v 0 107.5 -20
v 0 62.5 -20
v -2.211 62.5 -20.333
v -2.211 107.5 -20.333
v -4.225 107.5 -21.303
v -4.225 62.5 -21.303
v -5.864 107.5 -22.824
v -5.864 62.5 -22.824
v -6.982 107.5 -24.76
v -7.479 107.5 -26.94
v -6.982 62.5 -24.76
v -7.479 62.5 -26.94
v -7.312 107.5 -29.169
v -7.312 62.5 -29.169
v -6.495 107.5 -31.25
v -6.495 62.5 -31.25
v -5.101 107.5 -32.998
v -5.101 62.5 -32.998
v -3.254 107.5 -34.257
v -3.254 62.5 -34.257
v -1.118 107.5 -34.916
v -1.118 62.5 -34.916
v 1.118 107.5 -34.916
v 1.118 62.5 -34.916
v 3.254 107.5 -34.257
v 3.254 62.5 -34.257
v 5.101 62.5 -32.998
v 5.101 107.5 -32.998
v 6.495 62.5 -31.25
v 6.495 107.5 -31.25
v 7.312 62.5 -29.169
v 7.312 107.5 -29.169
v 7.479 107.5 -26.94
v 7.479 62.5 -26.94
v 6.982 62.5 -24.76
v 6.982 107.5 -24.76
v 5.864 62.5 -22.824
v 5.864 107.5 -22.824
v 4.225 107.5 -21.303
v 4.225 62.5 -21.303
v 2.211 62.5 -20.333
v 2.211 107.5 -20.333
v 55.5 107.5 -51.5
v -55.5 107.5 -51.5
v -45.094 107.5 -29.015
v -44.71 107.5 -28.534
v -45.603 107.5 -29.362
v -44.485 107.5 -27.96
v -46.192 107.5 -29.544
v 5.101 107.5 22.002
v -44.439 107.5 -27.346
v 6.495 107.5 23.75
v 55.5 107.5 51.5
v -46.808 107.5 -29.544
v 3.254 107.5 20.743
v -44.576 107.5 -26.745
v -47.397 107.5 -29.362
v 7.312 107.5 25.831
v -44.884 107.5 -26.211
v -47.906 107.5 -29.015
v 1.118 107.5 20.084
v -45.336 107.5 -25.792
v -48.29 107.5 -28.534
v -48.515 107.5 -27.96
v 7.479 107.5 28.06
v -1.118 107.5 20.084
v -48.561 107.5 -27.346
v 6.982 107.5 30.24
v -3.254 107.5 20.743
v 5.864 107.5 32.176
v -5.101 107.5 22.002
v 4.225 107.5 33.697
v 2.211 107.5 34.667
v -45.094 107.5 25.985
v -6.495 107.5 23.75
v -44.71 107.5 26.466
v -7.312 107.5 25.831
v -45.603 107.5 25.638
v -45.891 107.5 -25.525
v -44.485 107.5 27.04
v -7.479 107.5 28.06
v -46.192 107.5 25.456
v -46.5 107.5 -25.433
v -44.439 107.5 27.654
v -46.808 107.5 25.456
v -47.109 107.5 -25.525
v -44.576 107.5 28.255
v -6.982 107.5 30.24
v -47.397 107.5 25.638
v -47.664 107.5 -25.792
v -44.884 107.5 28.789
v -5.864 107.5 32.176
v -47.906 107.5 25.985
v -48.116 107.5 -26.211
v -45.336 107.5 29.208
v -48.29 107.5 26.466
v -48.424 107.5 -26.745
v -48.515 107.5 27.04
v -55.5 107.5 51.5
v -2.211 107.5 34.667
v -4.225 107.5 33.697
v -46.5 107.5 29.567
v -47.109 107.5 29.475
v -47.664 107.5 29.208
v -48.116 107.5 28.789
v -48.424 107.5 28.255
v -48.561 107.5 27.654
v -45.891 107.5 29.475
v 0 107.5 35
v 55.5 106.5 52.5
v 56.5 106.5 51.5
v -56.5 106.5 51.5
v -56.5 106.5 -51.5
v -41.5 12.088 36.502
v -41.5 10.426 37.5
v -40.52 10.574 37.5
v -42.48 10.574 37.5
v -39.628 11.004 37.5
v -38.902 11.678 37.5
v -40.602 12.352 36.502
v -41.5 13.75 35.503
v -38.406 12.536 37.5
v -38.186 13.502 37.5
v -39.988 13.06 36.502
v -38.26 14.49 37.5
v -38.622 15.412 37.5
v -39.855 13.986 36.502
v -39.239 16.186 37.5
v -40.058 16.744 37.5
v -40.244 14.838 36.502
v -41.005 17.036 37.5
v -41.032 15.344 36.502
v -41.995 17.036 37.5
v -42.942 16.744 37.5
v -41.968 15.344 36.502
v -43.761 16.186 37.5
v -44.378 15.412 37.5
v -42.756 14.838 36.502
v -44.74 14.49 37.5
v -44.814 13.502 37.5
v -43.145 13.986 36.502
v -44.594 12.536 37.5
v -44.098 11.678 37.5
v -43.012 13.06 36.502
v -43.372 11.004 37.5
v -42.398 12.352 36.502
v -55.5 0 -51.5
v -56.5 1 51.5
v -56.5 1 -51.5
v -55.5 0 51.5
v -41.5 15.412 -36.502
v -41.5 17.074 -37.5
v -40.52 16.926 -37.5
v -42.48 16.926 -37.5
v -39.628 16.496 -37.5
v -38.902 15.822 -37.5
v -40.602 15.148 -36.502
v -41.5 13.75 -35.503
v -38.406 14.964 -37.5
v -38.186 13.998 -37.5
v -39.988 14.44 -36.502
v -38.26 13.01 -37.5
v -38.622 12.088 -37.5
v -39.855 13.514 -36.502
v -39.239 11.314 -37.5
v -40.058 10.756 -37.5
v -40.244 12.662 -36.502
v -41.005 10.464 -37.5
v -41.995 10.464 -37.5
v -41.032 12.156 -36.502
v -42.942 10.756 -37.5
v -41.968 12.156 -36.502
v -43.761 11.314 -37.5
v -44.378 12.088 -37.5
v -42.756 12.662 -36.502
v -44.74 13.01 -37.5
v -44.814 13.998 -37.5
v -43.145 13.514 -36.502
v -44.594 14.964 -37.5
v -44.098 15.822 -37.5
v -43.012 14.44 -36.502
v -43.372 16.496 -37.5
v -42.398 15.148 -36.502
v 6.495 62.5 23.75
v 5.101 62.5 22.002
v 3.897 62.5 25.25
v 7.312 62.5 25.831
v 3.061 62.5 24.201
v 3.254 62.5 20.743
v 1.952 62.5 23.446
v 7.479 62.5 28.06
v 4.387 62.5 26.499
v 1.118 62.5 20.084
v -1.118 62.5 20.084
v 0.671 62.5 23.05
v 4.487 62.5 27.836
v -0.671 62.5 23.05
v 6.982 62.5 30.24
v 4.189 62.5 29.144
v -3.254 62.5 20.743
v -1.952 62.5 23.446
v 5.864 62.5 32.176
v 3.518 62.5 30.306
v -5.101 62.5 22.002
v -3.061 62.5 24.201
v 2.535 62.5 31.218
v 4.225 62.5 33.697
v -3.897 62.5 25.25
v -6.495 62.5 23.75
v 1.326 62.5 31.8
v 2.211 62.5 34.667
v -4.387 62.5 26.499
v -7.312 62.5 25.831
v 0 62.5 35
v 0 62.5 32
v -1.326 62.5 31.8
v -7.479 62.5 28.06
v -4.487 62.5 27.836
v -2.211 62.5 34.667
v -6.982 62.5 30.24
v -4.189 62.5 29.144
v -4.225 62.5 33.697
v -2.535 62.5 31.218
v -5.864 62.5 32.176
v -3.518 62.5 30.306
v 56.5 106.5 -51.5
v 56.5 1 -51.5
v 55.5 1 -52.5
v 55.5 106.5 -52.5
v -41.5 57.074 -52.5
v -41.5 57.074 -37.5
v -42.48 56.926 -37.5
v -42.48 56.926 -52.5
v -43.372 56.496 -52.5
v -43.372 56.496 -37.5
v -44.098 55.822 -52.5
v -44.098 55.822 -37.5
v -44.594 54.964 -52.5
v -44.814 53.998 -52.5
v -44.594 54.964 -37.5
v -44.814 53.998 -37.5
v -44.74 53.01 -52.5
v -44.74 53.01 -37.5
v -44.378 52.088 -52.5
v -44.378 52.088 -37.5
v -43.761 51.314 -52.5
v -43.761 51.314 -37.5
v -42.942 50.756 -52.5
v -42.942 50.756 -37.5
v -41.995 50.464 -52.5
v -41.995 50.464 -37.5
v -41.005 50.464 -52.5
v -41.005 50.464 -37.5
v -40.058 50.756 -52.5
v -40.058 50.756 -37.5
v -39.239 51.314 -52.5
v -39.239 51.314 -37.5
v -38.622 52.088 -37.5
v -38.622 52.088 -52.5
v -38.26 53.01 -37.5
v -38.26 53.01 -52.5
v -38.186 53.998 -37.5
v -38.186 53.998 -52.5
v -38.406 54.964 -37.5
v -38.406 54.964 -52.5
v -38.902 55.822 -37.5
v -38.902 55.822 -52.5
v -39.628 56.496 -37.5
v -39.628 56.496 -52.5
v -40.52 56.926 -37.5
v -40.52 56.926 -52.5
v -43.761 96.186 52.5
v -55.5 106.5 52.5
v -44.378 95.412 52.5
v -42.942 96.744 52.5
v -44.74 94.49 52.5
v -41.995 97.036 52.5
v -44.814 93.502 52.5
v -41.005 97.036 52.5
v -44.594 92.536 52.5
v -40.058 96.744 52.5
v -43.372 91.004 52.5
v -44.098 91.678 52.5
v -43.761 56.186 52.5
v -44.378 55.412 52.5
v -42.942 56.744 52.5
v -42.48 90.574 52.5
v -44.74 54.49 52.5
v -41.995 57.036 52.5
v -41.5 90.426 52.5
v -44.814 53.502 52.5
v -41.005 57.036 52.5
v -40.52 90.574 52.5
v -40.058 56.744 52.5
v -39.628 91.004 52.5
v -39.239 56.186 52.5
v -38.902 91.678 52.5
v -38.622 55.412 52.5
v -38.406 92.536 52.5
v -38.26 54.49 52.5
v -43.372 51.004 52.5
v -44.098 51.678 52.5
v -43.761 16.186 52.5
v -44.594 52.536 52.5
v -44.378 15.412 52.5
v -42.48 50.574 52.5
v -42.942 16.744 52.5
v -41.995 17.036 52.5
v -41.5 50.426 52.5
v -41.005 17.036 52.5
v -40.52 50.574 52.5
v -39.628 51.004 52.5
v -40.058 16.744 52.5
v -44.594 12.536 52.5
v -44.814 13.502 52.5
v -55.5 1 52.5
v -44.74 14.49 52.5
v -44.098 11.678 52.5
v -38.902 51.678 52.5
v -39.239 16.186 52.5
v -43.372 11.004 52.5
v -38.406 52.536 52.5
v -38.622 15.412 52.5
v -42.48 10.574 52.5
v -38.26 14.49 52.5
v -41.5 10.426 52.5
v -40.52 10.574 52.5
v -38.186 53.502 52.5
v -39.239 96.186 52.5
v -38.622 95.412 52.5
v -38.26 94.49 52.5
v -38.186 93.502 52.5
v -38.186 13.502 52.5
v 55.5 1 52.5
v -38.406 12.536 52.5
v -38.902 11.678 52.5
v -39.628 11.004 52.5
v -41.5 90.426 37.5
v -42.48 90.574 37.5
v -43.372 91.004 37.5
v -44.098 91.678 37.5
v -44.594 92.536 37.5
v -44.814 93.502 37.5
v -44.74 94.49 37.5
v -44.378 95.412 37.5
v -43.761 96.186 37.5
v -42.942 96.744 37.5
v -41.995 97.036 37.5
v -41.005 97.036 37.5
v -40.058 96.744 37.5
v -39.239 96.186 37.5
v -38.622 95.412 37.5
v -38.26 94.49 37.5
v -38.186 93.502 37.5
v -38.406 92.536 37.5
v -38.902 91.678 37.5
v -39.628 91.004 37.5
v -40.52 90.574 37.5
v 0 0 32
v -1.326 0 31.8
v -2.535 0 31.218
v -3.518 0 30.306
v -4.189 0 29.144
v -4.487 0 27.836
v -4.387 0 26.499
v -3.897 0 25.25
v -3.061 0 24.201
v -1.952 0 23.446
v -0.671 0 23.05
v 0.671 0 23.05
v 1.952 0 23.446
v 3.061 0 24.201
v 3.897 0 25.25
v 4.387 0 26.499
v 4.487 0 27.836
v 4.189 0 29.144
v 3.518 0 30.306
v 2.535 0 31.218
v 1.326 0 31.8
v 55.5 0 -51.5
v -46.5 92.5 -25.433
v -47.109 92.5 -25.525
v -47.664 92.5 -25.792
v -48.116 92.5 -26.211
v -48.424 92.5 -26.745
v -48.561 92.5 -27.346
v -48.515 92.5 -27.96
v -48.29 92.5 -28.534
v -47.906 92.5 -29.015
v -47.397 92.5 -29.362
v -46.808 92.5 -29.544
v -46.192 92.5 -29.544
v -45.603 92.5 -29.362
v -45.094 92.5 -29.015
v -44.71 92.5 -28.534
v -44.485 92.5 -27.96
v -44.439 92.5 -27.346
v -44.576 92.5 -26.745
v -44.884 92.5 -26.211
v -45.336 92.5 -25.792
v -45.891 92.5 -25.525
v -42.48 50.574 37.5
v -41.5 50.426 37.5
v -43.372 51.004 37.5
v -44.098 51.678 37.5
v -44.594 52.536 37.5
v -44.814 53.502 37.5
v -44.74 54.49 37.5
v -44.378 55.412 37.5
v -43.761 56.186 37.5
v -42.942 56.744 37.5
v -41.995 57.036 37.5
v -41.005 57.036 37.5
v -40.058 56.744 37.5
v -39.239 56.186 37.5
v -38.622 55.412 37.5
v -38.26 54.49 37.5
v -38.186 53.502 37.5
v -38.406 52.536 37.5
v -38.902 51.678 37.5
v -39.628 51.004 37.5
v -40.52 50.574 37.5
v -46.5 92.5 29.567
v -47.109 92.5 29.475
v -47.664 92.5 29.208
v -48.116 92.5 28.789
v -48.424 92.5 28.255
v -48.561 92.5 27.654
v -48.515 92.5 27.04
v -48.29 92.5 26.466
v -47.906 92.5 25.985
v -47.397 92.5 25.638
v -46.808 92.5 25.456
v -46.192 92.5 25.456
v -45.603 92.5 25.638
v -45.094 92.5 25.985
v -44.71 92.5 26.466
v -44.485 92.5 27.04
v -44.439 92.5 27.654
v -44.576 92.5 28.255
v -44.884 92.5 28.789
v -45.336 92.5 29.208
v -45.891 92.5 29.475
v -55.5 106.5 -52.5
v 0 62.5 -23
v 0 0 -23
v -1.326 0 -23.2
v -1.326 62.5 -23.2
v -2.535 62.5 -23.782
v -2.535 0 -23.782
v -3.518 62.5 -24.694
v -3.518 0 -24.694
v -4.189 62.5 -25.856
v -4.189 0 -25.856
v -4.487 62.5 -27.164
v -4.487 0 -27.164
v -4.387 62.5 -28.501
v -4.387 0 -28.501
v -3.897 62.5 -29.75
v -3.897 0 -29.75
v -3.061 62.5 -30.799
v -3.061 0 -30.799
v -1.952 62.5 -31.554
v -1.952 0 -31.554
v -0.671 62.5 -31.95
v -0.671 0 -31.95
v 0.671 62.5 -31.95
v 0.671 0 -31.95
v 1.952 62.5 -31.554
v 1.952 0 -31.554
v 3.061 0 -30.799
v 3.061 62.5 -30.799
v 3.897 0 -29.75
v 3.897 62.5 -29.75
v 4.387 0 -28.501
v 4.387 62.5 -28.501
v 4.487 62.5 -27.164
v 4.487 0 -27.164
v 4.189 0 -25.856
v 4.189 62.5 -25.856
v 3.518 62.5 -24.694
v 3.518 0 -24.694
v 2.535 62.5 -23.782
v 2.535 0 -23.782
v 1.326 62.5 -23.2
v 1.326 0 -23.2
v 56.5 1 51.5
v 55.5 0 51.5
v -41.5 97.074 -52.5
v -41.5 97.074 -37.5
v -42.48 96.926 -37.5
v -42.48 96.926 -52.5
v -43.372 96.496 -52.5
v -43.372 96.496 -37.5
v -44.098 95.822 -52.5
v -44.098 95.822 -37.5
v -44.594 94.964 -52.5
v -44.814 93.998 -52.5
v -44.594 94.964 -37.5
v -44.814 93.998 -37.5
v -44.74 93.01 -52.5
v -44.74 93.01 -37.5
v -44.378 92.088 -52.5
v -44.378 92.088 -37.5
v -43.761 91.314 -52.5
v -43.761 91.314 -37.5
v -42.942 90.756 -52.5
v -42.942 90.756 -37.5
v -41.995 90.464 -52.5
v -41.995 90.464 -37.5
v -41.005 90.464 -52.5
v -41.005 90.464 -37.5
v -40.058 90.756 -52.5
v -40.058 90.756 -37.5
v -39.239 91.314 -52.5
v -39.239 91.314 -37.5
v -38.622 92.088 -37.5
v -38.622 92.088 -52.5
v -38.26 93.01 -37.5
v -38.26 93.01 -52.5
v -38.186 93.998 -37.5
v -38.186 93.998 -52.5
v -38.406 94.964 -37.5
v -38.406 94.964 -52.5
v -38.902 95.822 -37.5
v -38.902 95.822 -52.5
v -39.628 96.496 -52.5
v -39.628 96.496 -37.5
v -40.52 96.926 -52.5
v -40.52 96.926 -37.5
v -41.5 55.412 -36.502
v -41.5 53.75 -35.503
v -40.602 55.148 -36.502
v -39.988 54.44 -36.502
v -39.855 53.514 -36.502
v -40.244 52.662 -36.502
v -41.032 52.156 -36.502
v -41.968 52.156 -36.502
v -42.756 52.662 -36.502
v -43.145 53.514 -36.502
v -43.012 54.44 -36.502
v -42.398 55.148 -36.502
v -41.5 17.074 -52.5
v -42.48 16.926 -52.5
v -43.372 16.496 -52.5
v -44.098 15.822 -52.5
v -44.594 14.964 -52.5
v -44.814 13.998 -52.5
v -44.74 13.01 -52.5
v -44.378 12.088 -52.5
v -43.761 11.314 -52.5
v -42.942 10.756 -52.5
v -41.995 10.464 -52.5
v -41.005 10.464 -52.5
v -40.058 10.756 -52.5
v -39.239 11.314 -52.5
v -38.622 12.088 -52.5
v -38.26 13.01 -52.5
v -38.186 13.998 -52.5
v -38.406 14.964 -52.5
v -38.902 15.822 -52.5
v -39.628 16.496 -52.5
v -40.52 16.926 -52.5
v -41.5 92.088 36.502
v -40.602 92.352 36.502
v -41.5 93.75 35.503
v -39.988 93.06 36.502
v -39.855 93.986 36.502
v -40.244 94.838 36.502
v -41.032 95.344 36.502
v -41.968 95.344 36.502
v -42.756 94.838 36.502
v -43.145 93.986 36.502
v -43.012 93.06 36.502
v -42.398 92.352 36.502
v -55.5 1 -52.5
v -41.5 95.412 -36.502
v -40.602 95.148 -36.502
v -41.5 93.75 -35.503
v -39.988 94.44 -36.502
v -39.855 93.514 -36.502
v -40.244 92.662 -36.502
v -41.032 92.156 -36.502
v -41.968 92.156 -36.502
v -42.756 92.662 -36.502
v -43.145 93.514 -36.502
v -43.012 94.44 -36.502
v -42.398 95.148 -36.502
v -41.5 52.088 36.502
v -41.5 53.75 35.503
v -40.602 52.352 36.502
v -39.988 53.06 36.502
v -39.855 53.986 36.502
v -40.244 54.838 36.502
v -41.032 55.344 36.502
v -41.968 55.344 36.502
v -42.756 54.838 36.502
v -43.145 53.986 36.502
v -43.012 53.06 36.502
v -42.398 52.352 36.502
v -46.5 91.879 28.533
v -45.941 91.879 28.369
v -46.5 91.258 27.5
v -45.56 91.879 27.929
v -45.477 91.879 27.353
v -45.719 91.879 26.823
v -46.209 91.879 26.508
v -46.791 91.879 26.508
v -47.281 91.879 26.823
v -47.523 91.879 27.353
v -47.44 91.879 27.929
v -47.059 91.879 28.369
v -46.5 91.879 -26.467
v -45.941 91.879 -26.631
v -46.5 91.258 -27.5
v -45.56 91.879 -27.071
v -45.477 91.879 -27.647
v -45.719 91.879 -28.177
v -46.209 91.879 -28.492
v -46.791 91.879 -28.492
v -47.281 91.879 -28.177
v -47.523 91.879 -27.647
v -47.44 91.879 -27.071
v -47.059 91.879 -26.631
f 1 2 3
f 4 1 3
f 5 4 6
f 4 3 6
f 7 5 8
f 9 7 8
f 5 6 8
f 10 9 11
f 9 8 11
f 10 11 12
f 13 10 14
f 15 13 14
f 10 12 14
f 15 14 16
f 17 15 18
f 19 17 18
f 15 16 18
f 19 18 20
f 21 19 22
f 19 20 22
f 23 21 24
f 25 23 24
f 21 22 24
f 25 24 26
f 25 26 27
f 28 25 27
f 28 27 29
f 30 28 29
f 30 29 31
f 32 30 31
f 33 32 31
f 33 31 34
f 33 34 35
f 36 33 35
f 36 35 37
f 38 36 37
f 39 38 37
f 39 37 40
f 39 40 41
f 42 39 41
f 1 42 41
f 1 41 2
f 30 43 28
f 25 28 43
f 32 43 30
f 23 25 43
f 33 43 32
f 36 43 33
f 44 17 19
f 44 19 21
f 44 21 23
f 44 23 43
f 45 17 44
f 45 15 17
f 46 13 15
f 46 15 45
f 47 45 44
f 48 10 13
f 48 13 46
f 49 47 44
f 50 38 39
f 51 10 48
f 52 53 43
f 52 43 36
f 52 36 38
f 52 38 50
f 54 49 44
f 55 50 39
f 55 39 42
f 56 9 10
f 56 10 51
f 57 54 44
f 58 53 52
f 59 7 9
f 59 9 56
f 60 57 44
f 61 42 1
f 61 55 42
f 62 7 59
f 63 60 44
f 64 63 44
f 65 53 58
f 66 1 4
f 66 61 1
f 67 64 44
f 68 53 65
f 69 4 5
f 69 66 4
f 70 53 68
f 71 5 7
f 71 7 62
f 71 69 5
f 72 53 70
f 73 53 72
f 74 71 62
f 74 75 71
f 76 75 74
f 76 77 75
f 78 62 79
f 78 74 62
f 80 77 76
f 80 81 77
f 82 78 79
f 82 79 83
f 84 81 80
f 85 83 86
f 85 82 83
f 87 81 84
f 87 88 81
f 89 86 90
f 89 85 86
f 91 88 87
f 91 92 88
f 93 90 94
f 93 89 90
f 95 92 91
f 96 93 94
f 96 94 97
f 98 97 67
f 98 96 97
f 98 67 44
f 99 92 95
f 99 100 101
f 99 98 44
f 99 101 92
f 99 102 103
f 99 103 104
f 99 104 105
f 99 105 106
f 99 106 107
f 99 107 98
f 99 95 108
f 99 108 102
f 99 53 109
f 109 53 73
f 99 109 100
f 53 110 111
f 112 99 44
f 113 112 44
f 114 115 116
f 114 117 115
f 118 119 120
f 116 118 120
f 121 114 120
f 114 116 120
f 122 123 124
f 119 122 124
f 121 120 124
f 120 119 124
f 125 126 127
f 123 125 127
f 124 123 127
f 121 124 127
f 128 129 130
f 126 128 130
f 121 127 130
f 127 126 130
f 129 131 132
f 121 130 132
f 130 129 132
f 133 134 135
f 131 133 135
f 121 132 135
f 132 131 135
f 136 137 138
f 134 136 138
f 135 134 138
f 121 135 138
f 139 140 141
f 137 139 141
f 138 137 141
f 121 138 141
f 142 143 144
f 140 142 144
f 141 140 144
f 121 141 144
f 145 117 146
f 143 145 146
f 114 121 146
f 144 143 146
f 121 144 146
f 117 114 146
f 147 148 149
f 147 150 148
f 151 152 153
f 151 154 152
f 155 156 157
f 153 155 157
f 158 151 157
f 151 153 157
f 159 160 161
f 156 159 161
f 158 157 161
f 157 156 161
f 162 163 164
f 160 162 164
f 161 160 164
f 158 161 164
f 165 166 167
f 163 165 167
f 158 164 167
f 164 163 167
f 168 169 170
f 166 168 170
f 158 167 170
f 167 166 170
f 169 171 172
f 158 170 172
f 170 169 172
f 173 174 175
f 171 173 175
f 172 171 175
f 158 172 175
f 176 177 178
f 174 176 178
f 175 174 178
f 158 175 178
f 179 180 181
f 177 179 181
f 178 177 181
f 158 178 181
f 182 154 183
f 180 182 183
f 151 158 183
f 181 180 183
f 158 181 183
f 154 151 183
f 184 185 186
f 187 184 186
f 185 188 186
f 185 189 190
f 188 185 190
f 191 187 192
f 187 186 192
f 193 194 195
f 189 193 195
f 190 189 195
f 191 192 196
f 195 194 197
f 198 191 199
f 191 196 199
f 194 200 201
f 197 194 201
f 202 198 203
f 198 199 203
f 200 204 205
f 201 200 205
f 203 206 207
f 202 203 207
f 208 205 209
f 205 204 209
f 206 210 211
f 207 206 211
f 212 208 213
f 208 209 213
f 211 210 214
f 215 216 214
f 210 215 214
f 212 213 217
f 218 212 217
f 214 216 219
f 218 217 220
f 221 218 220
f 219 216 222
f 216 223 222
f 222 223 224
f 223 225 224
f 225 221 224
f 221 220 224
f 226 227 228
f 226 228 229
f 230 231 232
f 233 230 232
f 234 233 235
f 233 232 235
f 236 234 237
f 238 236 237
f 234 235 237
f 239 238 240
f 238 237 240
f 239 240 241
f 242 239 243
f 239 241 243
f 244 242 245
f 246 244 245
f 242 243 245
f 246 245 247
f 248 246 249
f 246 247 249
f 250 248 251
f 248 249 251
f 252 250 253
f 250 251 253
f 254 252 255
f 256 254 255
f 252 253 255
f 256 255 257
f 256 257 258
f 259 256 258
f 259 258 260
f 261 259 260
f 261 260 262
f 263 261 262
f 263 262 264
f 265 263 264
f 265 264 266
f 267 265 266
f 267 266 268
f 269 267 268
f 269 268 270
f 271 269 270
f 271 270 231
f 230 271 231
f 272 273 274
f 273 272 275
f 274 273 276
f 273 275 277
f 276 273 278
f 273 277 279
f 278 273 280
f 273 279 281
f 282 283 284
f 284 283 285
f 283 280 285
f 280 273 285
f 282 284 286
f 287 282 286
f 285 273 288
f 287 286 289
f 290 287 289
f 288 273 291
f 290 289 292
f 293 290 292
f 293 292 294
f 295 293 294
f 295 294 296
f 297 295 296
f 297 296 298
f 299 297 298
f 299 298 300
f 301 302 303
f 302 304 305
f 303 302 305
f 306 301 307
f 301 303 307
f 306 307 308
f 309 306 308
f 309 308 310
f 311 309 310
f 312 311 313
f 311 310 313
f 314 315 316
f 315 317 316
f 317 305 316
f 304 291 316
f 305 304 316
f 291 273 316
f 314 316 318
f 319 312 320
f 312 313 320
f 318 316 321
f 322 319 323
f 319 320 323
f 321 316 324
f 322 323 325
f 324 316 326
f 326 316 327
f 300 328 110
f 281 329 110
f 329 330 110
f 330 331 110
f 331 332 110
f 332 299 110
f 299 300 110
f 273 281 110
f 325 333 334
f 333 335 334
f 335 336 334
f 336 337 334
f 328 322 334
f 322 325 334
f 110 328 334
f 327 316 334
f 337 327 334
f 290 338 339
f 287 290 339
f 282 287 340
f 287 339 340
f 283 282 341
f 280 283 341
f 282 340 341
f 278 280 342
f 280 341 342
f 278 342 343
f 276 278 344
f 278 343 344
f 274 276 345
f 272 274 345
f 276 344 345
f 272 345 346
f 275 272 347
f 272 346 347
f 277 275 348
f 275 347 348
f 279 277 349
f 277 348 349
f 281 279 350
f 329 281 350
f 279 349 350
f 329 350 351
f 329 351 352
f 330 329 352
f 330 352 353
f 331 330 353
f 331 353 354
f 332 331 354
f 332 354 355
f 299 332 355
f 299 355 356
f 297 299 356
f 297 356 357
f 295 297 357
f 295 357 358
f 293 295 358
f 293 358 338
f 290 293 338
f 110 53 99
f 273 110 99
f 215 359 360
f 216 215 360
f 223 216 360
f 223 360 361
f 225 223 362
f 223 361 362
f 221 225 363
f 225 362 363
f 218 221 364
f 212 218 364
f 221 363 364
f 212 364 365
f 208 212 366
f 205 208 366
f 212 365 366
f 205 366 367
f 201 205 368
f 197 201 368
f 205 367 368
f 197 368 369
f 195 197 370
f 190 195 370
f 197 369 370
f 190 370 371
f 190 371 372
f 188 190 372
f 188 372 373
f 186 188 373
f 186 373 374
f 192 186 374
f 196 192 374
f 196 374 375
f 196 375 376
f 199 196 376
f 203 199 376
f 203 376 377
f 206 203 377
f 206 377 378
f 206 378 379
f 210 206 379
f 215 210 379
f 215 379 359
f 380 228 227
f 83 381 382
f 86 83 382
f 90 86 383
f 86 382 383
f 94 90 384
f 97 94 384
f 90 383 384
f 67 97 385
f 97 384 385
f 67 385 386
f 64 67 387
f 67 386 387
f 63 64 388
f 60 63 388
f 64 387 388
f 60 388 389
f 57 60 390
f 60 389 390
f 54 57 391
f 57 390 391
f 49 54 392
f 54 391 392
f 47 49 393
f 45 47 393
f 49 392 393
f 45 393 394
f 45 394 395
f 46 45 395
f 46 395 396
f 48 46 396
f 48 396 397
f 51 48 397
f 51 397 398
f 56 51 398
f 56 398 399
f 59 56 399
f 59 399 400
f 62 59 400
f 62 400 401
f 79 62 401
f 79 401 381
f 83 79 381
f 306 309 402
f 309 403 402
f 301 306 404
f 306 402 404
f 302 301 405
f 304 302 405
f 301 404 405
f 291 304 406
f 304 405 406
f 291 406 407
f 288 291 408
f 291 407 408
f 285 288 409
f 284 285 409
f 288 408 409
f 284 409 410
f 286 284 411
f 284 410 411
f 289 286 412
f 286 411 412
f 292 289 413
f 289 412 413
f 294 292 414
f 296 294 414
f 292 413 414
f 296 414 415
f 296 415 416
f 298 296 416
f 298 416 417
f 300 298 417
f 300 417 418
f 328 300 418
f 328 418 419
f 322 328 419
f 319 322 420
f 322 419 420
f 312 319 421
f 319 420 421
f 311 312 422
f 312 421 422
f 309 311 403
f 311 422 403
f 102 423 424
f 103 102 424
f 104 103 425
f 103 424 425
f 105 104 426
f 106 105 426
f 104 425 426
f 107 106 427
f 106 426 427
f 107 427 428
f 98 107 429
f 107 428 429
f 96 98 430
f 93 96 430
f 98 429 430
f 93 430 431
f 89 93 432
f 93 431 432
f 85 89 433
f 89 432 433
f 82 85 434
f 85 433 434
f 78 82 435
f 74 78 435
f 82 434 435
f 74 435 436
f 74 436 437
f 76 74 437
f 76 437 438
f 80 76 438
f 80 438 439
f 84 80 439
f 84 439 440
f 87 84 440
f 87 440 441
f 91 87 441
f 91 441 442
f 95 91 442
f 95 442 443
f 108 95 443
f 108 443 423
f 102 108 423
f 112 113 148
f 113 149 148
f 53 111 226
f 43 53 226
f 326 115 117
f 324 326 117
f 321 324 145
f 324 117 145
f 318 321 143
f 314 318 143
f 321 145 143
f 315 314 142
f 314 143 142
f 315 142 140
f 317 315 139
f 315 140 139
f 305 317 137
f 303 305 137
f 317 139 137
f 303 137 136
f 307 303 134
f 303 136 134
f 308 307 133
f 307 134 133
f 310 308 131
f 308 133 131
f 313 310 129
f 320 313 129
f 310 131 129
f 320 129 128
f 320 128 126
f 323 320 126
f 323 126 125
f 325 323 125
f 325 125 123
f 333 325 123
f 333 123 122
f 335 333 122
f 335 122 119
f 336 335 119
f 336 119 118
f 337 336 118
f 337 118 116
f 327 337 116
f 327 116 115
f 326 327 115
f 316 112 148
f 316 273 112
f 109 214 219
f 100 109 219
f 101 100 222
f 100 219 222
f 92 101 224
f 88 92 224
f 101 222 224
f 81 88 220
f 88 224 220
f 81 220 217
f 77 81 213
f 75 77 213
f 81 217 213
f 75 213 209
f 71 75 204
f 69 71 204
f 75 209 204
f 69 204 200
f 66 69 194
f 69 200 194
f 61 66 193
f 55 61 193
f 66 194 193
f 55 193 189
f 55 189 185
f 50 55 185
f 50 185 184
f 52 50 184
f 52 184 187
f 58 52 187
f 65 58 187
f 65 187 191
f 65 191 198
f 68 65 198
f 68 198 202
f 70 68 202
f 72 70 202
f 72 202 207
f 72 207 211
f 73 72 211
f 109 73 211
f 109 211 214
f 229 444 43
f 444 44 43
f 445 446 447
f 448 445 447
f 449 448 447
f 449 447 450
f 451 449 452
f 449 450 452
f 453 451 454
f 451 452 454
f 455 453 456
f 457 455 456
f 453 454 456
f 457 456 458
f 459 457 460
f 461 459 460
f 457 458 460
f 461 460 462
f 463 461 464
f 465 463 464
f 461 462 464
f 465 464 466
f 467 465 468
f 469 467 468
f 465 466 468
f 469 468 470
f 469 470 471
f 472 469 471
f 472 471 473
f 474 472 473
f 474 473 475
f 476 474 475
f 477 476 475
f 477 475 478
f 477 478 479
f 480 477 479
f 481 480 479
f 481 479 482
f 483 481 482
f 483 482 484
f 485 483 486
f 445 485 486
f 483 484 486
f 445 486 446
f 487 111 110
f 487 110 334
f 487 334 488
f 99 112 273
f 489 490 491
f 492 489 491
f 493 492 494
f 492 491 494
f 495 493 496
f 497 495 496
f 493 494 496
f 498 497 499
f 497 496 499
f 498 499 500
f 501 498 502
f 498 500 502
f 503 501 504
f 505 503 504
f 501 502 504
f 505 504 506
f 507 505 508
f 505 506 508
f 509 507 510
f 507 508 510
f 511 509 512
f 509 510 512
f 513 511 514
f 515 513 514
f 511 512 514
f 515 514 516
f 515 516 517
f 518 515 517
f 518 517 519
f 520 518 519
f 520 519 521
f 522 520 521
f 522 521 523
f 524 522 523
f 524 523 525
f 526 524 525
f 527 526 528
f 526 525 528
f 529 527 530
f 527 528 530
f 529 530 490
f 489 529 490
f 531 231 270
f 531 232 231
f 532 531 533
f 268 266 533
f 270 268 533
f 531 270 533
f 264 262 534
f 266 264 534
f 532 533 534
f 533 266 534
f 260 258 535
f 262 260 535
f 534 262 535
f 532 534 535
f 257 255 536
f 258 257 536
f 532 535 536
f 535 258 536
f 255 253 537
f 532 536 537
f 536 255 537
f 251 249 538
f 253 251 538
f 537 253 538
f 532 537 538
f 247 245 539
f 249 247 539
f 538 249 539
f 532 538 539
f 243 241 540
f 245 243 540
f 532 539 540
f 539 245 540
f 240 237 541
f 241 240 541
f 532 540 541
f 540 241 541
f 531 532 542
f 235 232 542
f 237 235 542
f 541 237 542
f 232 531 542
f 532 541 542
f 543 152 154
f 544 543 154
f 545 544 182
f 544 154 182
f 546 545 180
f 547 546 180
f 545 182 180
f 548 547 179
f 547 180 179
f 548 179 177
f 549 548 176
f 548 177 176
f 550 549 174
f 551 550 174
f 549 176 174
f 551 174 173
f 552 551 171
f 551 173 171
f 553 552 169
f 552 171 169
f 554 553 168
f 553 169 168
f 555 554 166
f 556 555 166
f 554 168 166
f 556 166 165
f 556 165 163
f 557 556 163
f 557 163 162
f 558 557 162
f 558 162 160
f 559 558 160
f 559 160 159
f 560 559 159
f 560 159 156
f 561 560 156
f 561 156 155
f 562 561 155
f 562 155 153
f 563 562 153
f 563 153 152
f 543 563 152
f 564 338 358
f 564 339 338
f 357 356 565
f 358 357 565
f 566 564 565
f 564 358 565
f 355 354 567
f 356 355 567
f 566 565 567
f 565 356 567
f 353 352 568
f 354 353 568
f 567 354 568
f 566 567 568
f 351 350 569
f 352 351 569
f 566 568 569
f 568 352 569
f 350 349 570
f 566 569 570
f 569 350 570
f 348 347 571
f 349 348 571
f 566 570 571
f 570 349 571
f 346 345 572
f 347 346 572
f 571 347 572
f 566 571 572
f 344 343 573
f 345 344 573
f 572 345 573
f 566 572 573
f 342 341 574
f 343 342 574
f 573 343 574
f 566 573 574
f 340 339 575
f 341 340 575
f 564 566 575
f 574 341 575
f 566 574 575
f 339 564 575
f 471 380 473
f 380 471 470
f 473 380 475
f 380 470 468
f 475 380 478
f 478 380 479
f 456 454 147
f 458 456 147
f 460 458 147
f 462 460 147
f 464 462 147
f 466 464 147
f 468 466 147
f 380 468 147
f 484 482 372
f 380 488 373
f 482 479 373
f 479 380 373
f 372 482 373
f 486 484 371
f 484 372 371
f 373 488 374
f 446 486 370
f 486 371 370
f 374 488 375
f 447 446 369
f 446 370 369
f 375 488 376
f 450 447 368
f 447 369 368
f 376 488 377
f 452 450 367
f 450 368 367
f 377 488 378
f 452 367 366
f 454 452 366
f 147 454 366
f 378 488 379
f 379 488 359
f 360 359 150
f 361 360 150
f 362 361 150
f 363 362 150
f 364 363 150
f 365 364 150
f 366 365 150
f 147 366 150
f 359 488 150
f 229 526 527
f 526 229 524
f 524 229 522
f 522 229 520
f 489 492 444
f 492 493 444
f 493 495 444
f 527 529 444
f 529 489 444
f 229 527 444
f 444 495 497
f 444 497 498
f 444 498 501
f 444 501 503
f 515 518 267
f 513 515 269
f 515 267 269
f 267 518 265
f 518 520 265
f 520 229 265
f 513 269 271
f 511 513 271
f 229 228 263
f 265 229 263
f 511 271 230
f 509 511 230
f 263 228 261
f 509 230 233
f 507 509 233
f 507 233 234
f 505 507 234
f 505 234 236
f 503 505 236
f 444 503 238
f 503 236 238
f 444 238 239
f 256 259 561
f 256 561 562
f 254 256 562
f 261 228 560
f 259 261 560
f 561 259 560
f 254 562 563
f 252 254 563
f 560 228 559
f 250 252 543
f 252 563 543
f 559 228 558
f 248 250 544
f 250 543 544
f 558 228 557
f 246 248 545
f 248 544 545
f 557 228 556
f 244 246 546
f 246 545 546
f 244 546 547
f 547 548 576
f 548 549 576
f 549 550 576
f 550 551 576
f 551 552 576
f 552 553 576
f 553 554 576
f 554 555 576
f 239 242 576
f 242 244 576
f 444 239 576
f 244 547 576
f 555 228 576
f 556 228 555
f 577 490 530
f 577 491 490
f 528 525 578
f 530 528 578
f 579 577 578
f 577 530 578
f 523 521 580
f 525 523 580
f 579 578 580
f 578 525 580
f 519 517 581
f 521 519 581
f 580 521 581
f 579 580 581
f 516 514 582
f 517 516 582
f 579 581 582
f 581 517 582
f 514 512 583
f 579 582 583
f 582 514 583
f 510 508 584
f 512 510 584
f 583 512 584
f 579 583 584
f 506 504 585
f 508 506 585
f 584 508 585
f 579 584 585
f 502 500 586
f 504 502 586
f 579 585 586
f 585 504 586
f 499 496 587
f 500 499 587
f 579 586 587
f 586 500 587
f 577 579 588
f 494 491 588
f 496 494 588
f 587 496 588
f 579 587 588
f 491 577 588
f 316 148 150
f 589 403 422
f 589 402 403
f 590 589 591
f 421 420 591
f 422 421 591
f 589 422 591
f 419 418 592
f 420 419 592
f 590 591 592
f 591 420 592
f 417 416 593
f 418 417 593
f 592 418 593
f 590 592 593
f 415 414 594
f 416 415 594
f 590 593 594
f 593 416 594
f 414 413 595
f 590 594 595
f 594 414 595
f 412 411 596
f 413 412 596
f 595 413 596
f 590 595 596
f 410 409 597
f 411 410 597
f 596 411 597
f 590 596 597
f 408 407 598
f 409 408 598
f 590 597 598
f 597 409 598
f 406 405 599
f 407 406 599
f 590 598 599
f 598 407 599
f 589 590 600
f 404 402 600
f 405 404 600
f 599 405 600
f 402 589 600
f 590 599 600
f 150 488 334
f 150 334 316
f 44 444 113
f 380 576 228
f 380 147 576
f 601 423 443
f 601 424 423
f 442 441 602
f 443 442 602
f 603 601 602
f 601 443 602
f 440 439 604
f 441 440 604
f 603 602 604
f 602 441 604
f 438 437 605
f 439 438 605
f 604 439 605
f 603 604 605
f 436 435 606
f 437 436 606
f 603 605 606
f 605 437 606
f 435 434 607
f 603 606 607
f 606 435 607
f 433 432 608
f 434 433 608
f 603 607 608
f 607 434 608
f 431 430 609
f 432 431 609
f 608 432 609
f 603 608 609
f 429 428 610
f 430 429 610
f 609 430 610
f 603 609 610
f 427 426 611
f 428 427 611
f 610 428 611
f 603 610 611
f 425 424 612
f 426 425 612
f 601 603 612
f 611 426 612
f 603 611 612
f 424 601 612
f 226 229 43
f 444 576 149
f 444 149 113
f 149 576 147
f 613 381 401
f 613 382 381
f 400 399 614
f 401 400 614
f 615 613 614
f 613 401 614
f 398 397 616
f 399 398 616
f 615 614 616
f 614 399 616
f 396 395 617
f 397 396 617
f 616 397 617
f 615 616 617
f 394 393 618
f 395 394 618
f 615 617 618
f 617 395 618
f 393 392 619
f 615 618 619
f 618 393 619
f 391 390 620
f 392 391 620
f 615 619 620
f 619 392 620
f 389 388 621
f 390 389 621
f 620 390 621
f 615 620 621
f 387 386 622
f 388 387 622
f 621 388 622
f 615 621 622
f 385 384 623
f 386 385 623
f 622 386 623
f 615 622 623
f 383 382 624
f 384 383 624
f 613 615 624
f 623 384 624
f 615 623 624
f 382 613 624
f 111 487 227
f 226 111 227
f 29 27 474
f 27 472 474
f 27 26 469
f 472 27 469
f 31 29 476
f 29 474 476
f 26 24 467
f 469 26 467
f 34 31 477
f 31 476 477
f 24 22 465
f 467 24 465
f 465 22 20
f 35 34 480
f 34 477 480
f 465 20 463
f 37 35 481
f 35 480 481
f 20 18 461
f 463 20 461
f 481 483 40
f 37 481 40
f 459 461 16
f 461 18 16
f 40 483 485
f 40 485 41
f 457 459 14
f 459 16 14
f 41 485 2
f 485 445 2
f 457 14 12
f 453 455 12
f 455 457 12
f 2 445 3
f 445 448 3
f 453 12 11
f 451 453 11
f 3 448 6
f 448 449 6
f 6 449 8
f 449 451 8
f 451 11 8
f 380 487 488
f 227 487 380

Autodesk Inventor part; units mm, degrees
ref_plane "YZ Plane" through (0, 0, 0) normal (1, 0, 0) x (0, 1, 0)
ref_plane "XZ Plane" through (0, 0, 0) normal (0, 1, 0) x (-1, 0, 0)
ref_plane "XY Plane" through (0, 0, 0) normal (0, 0, 1) x (1, 0, 0)
sketch "Sketch5" plane through (0, 0, 0) normal (0, 1, 0) x (-1, 0, 0)
  line L0 (56.5, 52.5) -> (-56.5, 52.5)
  line L1 (-56.5, 52.5) -> (-56.5, -52.5)
  line L2 (-56.5, -52.5) -> (56.5, -52.5)
  line L3 (56.5, -52.5) -> (56.5, 52.5)
  point P0 (0, 0)
  point P1 (56.5, 0)
  point P2 (0, 52.5)
  dimension "d8" = 113
  dimension "d9" = 105
extrude "Extrusion5" add sketch "Sketch5" along normal blind 107.5
sketch "Sketch8" plane through (0, 107.5, 0) normal (0, 1, 0) x (1, 0, 0)
  circle A0 centre (0, 27.5) radius 7
  circle A1 centre (0, -27.5) radius 7
  line L0 (-56.5, -52.5) -> (56.5, -52.5) projected
  line L1 (56.5, -52.5) -> (56.5, 52.5) projected
  line L2 (56.5, 52.5) -> (-56.5, 52.5) projected
  line L3 (-56.5, 52.5) -> (-56.5, -52.5) projected
  point P0 (0, 52.5)
  point P1 (0, -52.5)
  point P2 (56.5, 0)
  point P3 (-56.5, 0)
  point P4 (0, -52.5)
  dimension "d21" = 113
  dimension "d22" = 105
  dimension "d61" = 55
  dimension "d62" = 27.5
hole "Hole1" at (0, 107.5, 27.5) at (0, 107.5, -27.5) direction (0, -1, 0) diameter 9 end through all counterbore diameter 15 counterbore depth 45 clearance for "Socket Head Cap Screw" size "M8" standard "Ansi Metric M Profile"
sketch "Sketch9" plane through (-56.5, 0, 52.5) normal (0, 0, 1) x (1, 0, 0)
  line L0 (0, 0) -> (0, 107.5) projected
  circle A0 centre (15, 93.75) radius 4
  circle A1 centre (15, 53.75) radius 4
  circle A2 centre (15, 13.75) radius 4
  point P0 (113, 0)
  point P1 (113, 107.5)
  point P2 (56.5, 0)
  point P3 (0, 53.75)
  dimension "d36" = 107.5
  dimension "d37" = 40
  dimension "d38" = 40
  dimension "d40" = 8
  dimension "d41" = 15
hole "Hole2" at (-41.5, 93.75, 52.5) at (-41.5, 53.75, 52.5) at (-41.5, 13.75, 52.5) direction (0, 0, -1) diameter 6.647 depth 15 tip angle 118 thread size "M8x1.25" class "6H" standard "ISO Metric profile"
sketch "Sketch10" plane through (56.5, 0, -52.5) normal (0, 0, -1) x (-1, 0, 0)
  circle A0 centre (98, 93.75) radius 4
  circle A1 centre (98, 53.75) radius 4
  circle A2 centre (98, 13.75) radius 4
  circle A3 centre (98, 53.75) radius 3.3235 projected
  circle A4 centre (98, 13.75) radius 3.3235 projected
  circle A5 centre (98, 93.75) radius 3.3235 projected
  dimension "d52" = 8
hole "Hole3" at (-41.5, 93.75, -52.5) at (-41.5, 53.75, -52.5) at (-41.5, 13.75, -52.5) direction (0, 0, 1) diameter 6.647 depth 15 tip angle 118 thread size "M8x1.25" class "6H" standard "ISO Metric profile"
sketch "Sketch11" plane through (0, 107.5, 0) normal (0, 1, 0) x (1, 0, 0)
  line L0 (-56.5, 52.5) -> (-56.5, -52.5) projected
  circle A0 centre (-46.5, -27.5) radius 4
  circle A1 centre (-46.5, 27.5) radius 4
  point P0 (0, 0)
  dimension "d63" = 55
  dimension "d64" = 10
  dimension "d65" = 8
  dimension "d73" = 27.5
hole "Hole4" at (-46.5, 107.5, 27.5) at (-46.5, 107.5, -27.5) direction (0, -1, 0) diameter 4.134 depth 15 tip angle 118 thread size "M5x0.8" class "6H" standard "ISO Metric profile"
chamfer "Chamfer2" distance 1 angle 45 12 edges at (56.5, 53.75, -52.5) (56.5, 53.75, 52.5) (-56.5, 53.75, 52.5) (-56.5, 53.75, -52.5) (0, 107.5, -52.5) (-56.5, 107.5, 0) (0, 107.5, 52.5) (56.5, 107.5, 0) (0, 0, -52.5) (-56.5, 0, 0) (0, 0, 52.5) (56.5, 0, 0)
equation "\"d62\" = 0.5 * d61"
equation "\"d38\" = d37"
equation "\"d73\" = 0.5 * d63"
properties part number "BC-10002" material "Aço Carbono AISI 1006"
